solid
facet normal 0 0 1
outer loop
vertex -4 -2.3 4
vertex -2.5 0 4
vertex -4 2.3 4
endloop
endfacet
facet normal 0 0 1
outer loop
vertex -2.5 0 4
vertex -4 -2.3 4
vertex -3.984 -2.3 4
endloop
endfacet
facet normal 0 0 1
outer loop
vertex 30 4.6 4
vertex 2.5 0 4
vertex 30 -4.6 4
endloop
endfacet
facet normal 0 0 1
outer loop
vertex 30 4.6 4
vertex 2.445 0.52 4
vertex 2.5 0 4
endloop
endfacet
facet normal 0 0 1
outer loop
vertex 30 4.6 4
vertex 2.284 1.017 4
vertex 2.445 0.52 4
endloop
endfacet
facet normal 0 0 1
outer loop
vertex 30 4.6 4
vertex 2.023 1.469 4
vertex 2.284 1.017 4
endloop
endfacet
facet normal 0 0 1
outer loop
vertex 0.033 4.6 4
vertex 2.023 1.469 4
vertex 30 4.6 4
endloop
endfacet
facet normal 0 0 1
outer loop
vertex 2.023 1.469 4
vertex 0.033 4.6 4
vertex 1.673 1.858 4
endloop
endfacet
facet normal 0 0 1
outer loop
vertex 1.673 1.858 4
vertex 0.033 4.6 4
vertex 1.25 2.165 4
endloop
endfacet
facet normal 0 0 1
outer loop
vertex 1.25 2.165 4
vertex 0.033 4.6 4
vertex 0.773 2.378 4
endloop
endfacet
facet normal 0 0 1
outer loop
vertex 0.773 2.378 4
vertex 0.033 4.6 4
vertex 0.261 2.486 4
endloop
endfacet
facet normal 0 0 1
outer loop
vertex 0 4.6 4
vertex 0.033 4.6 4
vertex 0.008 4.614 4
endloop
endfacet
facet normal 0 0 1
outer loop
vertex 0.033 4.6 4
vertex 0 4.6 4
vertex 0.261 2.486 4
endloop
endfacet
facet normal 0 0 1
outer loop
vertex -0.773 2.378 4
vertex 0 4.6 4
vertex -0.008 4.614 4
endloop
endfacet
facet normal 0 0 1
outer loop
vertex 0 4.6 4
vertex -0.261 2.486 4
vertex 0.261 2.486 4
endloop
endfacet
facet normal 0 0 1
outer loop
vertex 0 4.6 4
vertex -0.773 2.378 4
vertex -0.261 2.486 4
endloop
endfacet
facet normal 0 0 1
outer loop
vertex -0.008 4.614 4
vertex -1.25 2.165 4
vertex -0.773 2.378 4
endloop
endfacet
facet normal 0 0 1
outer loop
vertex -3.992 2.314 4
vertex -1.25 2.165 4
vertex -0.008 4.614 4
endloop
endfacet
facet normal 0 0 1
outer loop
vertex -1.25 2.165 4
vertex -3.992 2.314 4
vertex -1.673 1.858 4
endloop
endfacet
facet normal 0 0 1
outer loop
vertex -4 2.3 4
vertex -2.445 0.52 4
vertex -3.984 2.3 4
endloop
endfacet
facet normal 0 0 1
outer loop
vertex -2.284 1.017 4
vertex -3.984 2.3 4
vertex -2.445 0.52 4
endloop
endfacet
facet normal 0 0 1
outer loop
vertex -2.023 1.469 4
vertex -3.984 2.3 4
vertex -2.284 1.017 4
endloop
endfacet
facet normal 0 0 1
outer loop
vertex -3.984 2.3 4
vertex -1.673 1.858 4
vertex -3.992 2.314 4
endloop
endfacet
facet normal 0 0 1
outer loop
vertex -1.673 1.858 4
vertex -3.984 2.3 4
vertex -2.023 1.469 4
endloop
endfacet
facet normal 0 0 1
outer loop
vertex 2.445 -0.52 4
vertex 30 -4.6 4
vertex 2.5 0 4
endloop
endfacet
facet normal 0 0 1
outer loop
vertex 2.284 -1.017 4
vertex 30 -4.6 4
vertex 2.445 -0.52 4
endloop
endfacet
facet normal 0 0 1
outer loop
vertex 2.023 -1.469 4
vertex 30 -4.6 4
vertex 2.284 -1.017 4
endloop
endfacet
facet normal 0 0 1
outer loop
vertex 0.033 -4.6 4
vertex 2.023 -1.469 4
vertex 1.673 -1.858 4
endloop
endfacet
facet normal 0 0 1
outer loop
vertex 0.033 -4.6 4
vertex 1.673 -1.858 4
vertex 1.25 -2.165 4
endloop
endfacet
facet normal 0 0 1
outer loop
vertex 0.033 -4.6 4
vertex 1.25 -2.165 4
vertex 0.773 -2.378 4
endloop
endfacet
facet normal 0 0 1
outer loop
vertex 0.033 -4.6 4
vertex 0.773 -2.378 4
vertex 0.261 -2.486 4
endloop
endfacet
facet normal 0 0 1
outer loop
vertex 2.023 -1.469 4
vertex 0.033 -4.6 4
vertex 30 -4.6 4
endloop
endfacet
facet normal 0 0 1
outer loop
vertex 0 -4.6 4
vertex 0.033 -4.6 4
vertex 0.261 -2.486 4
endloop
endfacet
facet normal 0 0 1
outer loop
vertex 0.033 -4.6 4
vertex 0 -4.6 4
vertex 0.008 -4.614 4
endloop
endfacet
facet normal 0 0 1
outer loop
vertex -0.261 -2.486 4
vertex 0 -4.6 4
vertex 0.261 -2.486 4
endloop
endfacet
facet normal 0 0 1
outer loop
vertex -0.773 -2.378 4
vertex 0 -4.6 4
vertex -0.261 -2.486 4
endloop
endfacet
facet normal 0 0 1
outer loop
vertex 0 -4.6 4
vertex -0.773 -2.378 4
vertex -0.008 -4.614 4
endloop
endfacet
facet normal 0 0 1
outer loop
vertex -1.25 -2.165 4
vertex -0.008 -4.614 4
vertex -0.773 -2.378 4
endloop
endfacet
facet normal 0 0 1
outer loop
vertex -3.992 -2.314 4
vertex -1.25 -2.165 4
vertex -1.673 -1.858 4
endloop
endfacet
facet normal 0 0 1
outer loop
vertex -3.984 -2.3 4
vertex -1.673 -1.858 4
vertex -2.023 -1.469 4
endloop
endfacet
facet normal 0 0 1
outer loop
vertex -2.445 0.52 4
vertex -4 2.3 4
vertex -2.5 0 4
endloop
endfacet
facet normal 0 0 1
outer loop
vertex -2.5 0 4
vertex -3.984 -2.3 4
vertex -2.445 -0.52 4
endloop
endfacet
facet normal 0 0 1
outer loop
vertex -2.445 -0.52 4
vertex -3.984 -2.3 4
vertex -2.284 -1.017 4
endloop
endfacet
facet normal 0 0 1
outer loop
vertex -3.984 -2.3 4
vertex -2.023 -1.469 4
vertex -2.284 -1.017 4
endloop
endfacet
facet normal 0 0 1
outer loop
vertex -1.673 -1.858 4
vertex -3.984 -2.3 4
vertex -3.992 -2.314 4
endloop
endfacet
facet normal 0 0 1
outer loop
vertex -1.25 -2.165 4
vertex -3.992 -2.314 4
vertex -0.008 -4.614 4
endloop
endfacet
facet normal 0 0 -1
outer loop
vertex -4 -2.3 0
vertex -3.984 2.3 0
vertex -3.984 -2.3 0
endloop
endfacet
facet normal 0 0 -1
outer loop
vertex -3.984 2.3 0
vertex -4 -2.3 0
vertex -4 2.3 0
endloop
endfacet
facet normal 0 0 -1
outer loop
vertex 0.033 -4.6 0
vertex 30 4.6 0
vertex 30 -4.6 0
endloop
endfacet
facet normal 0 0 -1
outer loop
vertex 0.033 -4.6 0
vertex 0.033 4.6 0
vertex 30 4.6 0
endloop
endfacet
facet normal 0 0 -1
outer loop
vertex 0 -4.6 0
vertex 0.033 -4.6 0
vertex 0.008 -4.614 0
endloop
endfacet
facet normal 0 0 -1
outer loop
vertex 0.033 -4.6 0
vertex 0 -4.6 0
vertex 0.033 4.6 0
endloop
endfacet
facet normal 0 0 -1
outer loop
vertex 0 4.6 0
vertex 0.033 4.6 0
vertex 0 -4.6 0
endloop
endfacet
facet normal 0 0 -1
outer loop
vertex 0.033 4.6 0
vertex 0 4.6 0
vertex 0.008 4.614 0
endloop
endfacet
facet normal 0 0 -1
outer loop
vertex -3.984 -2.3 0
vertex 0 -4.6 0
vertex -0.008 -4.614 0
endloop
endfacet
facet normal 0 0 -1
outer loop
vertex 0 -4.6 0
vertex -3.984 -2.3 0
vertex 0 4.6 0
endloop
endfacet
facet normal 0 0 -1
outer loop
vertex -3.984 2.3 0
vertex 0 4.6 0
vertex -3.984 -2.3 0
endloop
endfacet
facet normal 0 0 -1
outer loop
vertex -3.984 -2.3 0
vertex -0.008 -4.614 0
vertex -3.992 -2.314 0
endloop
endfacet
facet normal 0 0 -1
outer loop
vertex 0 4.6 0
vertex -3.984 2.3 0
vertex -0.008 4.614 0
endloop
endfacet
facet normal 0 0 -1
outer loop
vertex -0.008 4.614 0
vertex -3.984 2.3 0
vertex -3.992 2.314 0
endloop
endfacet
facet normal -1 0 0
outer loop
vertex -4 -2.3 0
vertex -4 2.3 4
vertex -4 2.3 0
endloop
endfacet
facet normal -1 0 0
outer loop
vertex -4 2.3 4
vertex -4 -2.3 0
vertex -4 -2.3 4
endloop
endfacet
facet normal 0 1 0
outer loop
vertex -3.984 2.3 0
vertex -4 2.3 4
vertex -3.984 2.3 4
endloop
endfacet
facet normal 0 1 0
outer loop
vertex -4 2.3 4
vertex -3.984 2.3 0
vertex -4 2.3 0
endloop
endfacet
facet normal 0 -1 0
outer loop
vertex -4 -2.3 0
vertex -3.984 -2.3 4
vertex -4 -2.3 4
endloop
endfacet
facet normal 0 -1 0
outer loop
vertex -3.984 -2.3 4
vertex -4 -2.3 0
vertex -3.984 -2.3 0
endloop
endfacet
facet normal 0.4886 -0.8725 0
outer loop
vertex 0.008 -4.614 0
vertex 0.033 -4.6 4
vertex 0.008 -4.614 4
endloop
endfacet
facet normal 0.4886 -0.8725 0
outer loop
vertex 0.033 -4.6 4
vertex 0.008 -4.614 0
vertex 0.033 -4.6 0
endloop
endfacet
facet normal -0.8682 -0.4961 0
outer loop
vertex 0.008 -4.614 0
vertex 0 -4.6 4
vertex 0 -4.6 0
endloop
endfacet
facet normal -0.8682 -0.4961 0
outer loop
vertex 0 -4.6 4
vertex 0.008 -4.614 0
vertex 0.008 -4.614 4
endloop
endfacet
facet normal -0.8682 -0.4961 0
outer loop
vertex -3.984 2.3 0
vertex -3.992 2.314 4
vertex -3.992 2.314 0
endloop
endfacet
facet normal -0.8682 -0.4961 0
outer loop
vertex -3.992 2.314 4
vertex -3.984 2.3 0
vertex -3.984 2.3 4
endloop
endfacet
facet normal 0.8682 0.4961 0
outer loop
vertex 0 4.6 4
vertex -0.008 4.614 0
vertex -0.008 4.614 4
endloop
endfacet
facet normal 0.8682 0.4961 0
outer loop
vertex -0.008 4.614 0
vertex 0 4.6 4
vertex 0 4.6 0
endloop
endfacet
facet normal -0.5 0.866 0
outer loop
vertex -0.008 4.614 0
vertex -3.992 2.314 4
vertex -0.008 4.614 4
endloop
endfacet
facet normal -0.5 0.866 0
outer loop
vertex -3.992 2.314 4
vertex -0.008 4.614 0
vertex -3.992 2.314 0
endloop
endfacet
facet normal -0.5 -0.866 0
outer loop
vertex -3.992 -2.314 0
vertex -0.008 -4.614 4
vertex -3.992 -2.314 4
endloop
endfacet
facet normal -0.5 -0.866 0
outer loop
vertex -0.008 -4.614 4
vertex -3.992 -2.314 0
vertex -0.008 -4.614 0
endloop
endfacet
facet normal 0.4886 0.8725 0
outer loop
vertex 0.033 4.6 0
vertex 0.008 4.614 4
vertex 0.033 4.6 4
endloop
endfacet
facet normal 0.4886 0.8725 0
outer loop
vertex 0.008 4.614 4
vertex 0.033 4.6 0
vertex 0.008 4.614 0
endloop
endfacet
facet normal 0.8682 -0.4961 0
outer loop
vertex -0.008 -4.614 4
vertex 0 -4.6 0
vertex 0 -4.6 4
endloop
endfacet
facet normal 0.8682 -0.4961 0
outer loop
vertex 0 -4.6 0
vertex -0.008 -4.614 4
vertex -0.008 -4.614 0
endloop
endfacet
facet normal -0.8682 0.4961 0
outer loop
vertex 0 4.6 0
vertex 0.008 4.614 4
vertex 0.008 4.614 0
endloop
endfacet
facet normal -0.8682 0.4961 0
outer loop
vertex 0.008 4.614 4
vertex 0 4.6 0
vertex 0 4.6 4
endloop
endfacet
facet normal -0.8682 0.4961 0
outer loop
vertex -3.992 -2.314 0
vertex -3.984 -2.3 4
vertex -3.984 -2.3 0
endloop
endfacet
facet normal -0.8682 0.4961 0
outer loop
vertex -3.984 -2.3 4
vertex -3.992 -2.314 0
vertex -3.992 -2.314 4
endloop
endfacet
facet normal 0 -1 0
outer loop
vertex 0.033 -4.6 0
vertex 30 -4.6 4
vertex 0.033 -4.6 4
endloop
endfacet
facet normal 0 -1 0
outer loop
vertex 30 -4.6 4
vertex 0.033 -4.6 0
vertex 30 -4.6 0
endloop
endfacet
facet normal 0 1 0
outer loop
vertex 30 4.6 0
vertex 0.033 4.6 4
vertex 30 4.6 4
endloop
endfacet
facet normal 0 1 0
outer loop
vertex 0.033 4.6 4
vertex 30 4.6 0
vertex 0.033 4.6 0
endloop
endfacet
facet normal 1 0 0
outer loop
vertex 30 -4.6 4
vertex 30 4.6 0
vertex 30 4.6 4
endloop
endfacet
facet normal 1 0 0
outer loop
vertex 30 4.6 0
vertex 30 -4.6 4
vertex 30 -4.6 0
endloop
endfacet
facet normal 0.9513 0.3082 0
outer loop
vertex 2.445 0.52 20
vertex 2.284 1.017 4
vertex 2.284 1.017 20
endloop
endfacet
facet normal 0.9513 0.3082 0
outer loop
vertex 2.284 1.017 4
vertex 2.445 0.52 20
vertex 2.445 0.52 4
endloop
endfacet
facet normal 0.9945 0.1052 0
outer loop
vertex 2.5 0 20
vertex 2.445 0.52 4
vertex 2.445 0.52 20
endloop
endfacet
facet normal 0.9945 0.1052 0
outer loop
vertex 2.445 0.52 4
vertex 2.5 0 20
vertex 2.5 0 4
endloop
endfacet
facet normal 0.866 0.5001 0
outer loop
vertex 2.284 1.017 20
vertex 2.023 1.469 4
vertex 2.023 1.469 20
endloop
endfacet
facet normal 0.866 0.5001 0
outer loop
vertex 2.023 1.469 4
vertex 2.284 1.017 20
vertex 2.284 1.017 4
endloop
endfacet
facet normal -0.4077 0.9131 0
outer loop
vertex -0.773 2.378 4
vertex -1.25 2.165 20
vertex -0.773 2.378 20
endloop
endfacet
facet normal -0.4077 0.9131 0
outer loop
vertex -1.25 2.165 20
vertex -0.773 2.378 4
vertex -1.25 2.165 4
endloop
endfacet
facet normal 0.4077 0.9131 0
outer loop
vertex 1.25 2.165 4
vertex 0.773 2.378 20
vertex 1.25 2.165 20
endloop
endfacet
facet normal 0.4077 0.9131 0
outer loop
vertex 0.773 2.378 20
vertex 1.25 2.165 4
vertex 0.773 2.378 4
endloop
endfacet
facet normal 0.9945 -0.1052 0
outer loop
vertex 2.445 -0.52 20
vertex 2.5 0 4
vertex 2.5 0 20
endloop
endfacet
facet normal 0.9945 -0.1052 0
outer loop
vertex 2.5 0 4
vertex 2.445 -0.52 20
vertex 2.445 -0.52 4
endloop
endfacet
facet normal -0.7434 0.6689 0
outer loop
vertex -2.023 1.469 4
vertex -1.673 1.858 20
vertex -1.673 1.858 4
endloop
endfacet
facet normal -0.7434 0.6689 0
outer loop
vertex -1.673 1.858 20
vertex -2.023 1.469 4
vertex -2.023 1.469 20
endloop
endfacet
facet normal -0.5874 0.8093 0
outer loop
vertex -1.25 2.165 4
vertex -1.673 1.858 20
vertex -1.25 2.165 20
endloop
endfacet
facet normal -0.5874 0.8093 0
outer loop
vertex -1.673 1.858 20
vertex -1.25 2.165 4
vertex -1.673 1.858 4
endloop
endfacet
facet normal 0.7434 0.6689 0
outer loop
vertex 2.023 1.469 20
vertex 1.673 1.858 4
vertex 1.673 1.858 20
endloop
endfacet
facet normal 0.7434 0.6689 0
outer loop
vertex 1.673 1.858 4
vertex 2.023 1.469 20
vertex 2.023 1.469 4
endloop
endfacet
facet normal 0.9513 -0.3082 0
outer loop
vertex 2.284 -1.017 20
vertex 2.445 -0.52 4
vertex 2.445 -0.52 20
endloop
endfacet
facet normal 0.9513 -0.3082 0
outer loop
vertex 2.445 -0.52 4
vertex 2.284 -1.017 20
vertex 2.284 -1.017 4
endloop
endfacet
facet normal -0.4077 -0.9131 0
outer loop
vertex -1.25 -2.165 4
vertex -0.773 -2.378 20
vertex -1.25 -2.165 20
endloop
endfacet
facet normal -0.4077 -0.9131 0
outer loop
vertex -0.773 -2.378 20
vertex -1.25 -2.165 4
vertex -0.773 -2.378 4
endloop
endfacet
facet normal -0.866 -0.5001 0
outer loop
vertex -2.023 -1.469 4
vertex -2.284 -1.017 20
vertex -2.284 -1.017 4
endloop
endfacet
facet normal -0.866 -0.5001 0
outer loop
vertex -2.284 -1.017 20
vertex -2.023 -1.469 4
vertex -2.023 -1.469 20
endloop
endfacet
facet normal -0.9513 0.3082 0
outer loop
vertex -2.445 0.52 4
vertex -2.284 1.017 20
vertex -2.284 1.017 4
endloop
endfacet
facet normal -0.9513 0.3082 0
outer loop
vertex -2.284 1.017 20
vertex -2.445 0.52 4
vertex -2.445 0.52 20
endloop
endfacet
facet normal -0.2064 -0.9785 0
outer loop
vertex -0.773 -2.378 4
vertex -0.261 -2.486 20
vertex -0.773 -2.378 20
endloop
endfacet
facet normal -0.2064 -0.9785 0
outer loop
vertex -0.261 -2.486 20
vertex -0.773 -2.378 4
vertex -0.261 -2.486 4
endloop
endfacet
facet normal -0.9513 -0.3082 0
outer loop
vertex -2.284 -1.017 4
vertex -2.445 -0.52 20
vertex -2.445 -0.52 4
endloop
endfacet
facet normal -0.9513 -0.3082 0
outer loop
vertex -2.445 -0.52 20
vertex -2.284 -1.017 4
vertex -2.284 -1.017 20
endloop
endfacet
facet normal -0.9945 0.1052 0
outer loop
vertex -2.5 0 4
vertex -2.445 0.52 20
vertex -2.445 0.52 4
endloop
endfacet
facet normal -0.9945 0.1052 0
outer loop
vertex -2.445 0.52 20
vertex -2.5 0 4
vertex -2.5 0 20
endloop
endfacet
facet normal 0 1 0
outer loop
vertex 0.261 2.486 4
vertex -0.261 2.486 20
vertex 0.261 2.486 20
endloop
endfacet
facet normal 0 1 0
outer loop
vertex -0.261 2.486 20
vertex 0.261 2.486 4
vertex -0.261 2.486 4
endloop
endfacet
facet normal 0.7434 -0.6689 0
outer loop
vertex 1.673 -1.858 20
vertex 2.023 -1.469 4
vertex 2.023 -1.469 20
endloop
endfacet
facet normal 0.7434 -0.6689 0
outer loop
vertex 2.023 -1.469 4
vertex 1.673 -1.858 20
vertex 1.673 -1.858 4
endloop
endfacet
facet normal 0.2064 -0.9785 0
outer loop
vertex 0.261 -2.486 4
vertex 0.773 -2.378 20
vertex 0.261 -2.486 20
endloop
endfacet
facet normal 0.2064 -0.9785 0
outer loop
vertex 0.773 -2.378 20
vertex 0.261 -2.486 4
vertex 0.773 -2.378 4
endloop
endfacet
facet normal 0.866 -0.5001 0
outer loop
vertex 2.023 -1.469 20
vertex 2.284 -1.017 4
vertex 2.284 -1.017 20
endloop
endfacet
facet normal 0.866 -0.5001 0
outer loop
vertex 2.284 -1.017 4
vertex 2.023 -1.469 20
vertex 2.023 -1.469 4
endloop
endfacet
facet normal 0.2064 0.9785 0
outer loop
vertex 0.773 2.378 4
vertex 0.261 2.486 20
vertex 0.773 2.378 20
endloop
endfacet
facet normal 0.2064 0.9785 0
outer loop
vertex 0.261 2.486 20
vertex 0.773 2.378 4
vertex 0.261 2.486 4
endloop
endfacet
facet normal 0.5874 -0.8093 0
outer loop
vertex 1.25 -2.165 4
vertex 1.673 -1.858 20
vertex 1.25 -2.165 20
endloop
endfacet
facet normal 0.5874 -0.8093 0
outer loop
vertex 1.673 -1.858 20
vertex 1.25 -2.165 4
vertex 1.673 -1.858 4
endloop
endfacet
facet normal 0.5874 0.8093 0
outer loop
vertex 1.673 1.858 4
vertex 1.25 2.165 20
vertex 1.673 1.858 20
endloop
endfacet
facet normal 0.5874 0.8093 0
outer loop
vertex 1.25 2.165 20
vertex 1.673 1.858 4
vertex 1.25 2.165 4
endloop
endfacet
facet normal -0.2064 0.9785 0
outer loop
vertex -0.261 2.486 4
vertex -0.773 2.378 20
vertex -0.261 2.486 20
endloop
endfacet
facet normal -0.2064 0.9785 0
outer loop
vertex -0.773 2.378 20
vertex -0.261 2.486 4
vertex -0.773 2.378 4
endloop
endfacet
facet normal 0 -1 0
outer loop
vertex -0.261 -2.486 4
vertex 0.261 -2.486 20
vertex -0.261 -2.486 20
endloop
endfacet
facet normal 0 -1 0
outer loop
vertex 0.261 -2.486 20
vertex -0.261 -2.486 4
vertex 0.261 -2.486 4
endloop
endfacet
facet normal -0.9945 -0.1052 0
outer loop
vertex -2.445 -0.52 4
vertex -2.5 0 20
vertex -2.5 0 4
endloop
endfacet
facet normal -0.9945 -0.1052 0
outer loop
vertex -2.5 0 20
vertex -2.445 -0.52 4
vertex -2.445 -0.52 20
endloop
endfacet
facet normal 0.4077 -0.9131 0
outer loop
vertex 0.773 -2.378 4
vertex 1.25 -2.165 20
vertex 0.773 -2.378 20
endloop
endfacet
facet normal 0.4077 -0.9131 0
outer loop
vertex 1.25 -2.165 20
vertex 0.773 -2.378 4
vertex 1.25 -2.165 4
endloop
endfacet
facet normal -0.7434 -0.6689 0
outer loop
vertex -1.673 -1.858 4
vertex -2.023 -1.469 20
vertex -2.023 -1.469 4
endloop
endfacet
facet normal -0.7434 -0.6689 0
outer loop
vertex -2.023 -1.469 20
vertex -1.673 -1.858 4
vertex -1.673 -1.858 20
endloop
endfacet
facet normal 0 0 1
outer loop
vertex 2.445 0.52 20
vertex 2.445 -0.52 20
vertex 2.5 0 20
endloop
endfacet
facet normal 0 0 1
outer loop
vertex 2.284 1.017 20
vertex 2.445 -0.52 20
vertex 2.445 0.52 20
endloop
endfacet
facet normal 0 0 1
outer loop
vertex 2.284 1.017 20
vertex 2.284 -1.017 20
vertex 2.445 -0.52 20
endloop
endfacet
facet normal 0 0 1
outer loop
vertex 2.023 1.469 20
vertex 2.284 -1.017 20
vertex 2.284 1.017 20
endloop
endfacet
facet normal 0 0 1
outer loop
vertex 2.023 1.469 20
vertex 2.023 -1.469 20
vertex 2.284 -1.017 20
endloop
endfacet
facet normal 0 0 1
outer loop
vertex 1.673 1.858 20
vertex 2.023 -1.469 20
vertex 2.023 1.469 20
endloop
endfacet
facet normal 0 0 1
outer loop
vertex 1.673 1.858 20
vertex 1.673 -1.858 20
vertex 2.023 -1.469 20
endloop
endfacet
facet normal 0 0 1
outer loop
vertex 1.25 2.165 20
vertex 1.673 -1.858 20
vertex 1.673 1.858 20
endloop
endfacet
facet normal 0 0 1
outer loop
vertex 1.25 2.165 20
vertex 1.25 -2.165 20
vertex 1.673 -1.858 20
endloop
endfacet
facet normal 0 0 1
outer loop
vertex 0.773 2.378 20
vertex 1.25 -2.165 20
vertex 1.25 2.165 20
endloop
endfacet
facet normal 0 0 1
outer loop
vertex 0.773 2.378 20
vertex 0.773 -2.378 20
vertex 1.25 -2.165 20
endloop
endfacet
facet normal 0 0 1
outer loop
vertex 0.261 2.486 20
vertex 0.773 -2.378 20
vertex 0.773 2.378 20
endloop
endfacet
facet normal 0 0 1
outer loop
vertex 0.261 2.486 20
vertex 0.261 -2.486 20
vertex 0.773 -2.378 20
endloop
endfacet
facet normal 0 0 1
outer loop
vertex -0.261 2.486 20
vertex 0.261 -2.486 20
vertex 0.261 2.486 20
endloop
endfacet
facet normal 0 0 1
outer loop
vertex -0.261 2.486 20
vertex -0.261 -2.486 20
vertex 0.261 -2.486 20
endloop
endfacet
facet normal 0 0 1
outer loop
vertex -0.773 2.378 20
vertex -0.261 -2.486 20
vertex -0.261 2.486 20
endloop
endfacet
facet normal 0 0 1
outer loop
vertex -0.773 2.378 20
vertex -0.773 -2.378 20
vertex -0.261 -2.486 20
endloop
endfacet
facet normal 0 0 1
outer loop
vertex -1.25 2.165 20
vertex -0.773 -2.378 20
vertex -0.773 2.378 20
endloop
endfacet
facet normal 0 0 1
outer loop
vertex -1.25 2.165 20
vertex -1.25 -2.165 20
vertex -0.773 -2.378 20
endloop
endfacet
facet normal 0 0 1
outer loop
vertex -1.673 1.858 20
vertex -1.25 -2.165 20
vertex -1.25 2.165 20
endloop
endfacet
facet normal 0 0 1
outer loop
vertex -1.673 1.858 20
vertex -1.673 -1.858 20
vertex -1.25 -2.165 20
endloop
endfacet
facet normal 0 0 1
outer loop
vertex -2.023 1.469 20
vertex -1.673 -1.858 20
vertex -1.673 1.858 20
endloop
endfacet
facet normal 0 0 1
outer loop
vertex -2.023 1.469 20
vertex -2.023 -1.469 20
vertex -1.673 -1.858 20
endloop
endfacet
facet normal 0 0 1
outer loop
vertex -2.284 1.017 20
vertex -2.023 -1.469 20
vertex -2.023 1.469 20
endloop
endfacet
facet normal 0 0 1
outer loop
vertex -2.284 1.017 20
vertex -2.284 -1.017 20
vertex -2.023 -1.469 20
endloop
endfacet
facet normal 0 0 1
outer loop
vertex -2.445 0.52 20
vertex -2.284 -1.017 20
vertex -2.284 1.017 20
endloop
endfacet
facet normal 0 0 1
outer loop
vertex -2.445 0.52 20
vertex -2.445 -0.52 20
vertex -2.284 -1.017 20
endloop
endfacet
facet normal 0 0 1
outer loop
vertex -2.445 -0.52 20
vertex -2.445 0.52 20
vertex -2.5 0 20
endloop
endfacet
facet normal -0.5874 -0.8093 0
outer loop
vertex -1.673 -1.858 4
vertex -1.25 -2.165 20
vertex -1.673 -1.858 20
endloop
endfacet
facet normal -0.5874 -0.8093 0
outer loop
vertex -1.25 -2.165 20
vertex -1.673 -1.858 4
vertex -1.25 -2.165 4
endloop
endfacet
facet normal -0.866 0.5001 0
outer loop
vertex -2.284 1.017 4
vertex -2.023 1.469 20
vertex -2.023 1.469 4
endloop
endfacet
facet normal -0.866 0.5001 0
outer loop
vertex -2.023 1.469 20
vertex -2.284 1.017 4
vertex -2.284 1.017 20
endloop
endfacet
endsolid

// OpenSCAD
module boltHead(){
  $fn = 30;
  cylinder(r1 = 4.4, r2 = 2, h = 4, center = false);
}

module m5Bolt(length = 20){
  translate([0, 0, 4]){
    cylinder(r = 2, h = length, center = false, $fn = 30);
  }
  boltHead();
}

module m5Nut(){
  translate([0, 0, 2]){
    union(){
      cube([8, 4.6, 4], center = true);
      rotate([0, 0, 120]){
        cube([8, 4.6, 4], center = true);
      }
      rotate([0, 0, 240]){
        cube([8, 4.6, 4], center = true);
      }
    }
  }
}

module m5NutInsert(depth = 30){
    $fn=30;
    union(){
      m5Nut();
      translate([depth / 2, 0, 2]){
        rotate([90, 90, 0]){
          cube(size = [4, depth, 9.2], center = true);
        }
      }
      cylinder(r=2.5, h=20, center=false);
    }
}

// m5Bolt();
m5Nut();
m5NutInsert();
